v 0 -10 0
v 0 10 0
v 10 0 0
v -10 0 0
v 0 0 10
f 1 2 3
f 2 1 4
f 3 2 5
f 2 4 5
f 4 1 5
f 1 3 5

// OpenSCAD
polyhedron(faces = [[0, 1, 2, 3], [4, 1, 0], [4, 2, 1], [4, 3, 2], [4, 0, 3]], points = [[10, 0, 0], [0, 10, 0], [-10, 0, 0], [0, -10, 0], [0, 0, 10]]);
